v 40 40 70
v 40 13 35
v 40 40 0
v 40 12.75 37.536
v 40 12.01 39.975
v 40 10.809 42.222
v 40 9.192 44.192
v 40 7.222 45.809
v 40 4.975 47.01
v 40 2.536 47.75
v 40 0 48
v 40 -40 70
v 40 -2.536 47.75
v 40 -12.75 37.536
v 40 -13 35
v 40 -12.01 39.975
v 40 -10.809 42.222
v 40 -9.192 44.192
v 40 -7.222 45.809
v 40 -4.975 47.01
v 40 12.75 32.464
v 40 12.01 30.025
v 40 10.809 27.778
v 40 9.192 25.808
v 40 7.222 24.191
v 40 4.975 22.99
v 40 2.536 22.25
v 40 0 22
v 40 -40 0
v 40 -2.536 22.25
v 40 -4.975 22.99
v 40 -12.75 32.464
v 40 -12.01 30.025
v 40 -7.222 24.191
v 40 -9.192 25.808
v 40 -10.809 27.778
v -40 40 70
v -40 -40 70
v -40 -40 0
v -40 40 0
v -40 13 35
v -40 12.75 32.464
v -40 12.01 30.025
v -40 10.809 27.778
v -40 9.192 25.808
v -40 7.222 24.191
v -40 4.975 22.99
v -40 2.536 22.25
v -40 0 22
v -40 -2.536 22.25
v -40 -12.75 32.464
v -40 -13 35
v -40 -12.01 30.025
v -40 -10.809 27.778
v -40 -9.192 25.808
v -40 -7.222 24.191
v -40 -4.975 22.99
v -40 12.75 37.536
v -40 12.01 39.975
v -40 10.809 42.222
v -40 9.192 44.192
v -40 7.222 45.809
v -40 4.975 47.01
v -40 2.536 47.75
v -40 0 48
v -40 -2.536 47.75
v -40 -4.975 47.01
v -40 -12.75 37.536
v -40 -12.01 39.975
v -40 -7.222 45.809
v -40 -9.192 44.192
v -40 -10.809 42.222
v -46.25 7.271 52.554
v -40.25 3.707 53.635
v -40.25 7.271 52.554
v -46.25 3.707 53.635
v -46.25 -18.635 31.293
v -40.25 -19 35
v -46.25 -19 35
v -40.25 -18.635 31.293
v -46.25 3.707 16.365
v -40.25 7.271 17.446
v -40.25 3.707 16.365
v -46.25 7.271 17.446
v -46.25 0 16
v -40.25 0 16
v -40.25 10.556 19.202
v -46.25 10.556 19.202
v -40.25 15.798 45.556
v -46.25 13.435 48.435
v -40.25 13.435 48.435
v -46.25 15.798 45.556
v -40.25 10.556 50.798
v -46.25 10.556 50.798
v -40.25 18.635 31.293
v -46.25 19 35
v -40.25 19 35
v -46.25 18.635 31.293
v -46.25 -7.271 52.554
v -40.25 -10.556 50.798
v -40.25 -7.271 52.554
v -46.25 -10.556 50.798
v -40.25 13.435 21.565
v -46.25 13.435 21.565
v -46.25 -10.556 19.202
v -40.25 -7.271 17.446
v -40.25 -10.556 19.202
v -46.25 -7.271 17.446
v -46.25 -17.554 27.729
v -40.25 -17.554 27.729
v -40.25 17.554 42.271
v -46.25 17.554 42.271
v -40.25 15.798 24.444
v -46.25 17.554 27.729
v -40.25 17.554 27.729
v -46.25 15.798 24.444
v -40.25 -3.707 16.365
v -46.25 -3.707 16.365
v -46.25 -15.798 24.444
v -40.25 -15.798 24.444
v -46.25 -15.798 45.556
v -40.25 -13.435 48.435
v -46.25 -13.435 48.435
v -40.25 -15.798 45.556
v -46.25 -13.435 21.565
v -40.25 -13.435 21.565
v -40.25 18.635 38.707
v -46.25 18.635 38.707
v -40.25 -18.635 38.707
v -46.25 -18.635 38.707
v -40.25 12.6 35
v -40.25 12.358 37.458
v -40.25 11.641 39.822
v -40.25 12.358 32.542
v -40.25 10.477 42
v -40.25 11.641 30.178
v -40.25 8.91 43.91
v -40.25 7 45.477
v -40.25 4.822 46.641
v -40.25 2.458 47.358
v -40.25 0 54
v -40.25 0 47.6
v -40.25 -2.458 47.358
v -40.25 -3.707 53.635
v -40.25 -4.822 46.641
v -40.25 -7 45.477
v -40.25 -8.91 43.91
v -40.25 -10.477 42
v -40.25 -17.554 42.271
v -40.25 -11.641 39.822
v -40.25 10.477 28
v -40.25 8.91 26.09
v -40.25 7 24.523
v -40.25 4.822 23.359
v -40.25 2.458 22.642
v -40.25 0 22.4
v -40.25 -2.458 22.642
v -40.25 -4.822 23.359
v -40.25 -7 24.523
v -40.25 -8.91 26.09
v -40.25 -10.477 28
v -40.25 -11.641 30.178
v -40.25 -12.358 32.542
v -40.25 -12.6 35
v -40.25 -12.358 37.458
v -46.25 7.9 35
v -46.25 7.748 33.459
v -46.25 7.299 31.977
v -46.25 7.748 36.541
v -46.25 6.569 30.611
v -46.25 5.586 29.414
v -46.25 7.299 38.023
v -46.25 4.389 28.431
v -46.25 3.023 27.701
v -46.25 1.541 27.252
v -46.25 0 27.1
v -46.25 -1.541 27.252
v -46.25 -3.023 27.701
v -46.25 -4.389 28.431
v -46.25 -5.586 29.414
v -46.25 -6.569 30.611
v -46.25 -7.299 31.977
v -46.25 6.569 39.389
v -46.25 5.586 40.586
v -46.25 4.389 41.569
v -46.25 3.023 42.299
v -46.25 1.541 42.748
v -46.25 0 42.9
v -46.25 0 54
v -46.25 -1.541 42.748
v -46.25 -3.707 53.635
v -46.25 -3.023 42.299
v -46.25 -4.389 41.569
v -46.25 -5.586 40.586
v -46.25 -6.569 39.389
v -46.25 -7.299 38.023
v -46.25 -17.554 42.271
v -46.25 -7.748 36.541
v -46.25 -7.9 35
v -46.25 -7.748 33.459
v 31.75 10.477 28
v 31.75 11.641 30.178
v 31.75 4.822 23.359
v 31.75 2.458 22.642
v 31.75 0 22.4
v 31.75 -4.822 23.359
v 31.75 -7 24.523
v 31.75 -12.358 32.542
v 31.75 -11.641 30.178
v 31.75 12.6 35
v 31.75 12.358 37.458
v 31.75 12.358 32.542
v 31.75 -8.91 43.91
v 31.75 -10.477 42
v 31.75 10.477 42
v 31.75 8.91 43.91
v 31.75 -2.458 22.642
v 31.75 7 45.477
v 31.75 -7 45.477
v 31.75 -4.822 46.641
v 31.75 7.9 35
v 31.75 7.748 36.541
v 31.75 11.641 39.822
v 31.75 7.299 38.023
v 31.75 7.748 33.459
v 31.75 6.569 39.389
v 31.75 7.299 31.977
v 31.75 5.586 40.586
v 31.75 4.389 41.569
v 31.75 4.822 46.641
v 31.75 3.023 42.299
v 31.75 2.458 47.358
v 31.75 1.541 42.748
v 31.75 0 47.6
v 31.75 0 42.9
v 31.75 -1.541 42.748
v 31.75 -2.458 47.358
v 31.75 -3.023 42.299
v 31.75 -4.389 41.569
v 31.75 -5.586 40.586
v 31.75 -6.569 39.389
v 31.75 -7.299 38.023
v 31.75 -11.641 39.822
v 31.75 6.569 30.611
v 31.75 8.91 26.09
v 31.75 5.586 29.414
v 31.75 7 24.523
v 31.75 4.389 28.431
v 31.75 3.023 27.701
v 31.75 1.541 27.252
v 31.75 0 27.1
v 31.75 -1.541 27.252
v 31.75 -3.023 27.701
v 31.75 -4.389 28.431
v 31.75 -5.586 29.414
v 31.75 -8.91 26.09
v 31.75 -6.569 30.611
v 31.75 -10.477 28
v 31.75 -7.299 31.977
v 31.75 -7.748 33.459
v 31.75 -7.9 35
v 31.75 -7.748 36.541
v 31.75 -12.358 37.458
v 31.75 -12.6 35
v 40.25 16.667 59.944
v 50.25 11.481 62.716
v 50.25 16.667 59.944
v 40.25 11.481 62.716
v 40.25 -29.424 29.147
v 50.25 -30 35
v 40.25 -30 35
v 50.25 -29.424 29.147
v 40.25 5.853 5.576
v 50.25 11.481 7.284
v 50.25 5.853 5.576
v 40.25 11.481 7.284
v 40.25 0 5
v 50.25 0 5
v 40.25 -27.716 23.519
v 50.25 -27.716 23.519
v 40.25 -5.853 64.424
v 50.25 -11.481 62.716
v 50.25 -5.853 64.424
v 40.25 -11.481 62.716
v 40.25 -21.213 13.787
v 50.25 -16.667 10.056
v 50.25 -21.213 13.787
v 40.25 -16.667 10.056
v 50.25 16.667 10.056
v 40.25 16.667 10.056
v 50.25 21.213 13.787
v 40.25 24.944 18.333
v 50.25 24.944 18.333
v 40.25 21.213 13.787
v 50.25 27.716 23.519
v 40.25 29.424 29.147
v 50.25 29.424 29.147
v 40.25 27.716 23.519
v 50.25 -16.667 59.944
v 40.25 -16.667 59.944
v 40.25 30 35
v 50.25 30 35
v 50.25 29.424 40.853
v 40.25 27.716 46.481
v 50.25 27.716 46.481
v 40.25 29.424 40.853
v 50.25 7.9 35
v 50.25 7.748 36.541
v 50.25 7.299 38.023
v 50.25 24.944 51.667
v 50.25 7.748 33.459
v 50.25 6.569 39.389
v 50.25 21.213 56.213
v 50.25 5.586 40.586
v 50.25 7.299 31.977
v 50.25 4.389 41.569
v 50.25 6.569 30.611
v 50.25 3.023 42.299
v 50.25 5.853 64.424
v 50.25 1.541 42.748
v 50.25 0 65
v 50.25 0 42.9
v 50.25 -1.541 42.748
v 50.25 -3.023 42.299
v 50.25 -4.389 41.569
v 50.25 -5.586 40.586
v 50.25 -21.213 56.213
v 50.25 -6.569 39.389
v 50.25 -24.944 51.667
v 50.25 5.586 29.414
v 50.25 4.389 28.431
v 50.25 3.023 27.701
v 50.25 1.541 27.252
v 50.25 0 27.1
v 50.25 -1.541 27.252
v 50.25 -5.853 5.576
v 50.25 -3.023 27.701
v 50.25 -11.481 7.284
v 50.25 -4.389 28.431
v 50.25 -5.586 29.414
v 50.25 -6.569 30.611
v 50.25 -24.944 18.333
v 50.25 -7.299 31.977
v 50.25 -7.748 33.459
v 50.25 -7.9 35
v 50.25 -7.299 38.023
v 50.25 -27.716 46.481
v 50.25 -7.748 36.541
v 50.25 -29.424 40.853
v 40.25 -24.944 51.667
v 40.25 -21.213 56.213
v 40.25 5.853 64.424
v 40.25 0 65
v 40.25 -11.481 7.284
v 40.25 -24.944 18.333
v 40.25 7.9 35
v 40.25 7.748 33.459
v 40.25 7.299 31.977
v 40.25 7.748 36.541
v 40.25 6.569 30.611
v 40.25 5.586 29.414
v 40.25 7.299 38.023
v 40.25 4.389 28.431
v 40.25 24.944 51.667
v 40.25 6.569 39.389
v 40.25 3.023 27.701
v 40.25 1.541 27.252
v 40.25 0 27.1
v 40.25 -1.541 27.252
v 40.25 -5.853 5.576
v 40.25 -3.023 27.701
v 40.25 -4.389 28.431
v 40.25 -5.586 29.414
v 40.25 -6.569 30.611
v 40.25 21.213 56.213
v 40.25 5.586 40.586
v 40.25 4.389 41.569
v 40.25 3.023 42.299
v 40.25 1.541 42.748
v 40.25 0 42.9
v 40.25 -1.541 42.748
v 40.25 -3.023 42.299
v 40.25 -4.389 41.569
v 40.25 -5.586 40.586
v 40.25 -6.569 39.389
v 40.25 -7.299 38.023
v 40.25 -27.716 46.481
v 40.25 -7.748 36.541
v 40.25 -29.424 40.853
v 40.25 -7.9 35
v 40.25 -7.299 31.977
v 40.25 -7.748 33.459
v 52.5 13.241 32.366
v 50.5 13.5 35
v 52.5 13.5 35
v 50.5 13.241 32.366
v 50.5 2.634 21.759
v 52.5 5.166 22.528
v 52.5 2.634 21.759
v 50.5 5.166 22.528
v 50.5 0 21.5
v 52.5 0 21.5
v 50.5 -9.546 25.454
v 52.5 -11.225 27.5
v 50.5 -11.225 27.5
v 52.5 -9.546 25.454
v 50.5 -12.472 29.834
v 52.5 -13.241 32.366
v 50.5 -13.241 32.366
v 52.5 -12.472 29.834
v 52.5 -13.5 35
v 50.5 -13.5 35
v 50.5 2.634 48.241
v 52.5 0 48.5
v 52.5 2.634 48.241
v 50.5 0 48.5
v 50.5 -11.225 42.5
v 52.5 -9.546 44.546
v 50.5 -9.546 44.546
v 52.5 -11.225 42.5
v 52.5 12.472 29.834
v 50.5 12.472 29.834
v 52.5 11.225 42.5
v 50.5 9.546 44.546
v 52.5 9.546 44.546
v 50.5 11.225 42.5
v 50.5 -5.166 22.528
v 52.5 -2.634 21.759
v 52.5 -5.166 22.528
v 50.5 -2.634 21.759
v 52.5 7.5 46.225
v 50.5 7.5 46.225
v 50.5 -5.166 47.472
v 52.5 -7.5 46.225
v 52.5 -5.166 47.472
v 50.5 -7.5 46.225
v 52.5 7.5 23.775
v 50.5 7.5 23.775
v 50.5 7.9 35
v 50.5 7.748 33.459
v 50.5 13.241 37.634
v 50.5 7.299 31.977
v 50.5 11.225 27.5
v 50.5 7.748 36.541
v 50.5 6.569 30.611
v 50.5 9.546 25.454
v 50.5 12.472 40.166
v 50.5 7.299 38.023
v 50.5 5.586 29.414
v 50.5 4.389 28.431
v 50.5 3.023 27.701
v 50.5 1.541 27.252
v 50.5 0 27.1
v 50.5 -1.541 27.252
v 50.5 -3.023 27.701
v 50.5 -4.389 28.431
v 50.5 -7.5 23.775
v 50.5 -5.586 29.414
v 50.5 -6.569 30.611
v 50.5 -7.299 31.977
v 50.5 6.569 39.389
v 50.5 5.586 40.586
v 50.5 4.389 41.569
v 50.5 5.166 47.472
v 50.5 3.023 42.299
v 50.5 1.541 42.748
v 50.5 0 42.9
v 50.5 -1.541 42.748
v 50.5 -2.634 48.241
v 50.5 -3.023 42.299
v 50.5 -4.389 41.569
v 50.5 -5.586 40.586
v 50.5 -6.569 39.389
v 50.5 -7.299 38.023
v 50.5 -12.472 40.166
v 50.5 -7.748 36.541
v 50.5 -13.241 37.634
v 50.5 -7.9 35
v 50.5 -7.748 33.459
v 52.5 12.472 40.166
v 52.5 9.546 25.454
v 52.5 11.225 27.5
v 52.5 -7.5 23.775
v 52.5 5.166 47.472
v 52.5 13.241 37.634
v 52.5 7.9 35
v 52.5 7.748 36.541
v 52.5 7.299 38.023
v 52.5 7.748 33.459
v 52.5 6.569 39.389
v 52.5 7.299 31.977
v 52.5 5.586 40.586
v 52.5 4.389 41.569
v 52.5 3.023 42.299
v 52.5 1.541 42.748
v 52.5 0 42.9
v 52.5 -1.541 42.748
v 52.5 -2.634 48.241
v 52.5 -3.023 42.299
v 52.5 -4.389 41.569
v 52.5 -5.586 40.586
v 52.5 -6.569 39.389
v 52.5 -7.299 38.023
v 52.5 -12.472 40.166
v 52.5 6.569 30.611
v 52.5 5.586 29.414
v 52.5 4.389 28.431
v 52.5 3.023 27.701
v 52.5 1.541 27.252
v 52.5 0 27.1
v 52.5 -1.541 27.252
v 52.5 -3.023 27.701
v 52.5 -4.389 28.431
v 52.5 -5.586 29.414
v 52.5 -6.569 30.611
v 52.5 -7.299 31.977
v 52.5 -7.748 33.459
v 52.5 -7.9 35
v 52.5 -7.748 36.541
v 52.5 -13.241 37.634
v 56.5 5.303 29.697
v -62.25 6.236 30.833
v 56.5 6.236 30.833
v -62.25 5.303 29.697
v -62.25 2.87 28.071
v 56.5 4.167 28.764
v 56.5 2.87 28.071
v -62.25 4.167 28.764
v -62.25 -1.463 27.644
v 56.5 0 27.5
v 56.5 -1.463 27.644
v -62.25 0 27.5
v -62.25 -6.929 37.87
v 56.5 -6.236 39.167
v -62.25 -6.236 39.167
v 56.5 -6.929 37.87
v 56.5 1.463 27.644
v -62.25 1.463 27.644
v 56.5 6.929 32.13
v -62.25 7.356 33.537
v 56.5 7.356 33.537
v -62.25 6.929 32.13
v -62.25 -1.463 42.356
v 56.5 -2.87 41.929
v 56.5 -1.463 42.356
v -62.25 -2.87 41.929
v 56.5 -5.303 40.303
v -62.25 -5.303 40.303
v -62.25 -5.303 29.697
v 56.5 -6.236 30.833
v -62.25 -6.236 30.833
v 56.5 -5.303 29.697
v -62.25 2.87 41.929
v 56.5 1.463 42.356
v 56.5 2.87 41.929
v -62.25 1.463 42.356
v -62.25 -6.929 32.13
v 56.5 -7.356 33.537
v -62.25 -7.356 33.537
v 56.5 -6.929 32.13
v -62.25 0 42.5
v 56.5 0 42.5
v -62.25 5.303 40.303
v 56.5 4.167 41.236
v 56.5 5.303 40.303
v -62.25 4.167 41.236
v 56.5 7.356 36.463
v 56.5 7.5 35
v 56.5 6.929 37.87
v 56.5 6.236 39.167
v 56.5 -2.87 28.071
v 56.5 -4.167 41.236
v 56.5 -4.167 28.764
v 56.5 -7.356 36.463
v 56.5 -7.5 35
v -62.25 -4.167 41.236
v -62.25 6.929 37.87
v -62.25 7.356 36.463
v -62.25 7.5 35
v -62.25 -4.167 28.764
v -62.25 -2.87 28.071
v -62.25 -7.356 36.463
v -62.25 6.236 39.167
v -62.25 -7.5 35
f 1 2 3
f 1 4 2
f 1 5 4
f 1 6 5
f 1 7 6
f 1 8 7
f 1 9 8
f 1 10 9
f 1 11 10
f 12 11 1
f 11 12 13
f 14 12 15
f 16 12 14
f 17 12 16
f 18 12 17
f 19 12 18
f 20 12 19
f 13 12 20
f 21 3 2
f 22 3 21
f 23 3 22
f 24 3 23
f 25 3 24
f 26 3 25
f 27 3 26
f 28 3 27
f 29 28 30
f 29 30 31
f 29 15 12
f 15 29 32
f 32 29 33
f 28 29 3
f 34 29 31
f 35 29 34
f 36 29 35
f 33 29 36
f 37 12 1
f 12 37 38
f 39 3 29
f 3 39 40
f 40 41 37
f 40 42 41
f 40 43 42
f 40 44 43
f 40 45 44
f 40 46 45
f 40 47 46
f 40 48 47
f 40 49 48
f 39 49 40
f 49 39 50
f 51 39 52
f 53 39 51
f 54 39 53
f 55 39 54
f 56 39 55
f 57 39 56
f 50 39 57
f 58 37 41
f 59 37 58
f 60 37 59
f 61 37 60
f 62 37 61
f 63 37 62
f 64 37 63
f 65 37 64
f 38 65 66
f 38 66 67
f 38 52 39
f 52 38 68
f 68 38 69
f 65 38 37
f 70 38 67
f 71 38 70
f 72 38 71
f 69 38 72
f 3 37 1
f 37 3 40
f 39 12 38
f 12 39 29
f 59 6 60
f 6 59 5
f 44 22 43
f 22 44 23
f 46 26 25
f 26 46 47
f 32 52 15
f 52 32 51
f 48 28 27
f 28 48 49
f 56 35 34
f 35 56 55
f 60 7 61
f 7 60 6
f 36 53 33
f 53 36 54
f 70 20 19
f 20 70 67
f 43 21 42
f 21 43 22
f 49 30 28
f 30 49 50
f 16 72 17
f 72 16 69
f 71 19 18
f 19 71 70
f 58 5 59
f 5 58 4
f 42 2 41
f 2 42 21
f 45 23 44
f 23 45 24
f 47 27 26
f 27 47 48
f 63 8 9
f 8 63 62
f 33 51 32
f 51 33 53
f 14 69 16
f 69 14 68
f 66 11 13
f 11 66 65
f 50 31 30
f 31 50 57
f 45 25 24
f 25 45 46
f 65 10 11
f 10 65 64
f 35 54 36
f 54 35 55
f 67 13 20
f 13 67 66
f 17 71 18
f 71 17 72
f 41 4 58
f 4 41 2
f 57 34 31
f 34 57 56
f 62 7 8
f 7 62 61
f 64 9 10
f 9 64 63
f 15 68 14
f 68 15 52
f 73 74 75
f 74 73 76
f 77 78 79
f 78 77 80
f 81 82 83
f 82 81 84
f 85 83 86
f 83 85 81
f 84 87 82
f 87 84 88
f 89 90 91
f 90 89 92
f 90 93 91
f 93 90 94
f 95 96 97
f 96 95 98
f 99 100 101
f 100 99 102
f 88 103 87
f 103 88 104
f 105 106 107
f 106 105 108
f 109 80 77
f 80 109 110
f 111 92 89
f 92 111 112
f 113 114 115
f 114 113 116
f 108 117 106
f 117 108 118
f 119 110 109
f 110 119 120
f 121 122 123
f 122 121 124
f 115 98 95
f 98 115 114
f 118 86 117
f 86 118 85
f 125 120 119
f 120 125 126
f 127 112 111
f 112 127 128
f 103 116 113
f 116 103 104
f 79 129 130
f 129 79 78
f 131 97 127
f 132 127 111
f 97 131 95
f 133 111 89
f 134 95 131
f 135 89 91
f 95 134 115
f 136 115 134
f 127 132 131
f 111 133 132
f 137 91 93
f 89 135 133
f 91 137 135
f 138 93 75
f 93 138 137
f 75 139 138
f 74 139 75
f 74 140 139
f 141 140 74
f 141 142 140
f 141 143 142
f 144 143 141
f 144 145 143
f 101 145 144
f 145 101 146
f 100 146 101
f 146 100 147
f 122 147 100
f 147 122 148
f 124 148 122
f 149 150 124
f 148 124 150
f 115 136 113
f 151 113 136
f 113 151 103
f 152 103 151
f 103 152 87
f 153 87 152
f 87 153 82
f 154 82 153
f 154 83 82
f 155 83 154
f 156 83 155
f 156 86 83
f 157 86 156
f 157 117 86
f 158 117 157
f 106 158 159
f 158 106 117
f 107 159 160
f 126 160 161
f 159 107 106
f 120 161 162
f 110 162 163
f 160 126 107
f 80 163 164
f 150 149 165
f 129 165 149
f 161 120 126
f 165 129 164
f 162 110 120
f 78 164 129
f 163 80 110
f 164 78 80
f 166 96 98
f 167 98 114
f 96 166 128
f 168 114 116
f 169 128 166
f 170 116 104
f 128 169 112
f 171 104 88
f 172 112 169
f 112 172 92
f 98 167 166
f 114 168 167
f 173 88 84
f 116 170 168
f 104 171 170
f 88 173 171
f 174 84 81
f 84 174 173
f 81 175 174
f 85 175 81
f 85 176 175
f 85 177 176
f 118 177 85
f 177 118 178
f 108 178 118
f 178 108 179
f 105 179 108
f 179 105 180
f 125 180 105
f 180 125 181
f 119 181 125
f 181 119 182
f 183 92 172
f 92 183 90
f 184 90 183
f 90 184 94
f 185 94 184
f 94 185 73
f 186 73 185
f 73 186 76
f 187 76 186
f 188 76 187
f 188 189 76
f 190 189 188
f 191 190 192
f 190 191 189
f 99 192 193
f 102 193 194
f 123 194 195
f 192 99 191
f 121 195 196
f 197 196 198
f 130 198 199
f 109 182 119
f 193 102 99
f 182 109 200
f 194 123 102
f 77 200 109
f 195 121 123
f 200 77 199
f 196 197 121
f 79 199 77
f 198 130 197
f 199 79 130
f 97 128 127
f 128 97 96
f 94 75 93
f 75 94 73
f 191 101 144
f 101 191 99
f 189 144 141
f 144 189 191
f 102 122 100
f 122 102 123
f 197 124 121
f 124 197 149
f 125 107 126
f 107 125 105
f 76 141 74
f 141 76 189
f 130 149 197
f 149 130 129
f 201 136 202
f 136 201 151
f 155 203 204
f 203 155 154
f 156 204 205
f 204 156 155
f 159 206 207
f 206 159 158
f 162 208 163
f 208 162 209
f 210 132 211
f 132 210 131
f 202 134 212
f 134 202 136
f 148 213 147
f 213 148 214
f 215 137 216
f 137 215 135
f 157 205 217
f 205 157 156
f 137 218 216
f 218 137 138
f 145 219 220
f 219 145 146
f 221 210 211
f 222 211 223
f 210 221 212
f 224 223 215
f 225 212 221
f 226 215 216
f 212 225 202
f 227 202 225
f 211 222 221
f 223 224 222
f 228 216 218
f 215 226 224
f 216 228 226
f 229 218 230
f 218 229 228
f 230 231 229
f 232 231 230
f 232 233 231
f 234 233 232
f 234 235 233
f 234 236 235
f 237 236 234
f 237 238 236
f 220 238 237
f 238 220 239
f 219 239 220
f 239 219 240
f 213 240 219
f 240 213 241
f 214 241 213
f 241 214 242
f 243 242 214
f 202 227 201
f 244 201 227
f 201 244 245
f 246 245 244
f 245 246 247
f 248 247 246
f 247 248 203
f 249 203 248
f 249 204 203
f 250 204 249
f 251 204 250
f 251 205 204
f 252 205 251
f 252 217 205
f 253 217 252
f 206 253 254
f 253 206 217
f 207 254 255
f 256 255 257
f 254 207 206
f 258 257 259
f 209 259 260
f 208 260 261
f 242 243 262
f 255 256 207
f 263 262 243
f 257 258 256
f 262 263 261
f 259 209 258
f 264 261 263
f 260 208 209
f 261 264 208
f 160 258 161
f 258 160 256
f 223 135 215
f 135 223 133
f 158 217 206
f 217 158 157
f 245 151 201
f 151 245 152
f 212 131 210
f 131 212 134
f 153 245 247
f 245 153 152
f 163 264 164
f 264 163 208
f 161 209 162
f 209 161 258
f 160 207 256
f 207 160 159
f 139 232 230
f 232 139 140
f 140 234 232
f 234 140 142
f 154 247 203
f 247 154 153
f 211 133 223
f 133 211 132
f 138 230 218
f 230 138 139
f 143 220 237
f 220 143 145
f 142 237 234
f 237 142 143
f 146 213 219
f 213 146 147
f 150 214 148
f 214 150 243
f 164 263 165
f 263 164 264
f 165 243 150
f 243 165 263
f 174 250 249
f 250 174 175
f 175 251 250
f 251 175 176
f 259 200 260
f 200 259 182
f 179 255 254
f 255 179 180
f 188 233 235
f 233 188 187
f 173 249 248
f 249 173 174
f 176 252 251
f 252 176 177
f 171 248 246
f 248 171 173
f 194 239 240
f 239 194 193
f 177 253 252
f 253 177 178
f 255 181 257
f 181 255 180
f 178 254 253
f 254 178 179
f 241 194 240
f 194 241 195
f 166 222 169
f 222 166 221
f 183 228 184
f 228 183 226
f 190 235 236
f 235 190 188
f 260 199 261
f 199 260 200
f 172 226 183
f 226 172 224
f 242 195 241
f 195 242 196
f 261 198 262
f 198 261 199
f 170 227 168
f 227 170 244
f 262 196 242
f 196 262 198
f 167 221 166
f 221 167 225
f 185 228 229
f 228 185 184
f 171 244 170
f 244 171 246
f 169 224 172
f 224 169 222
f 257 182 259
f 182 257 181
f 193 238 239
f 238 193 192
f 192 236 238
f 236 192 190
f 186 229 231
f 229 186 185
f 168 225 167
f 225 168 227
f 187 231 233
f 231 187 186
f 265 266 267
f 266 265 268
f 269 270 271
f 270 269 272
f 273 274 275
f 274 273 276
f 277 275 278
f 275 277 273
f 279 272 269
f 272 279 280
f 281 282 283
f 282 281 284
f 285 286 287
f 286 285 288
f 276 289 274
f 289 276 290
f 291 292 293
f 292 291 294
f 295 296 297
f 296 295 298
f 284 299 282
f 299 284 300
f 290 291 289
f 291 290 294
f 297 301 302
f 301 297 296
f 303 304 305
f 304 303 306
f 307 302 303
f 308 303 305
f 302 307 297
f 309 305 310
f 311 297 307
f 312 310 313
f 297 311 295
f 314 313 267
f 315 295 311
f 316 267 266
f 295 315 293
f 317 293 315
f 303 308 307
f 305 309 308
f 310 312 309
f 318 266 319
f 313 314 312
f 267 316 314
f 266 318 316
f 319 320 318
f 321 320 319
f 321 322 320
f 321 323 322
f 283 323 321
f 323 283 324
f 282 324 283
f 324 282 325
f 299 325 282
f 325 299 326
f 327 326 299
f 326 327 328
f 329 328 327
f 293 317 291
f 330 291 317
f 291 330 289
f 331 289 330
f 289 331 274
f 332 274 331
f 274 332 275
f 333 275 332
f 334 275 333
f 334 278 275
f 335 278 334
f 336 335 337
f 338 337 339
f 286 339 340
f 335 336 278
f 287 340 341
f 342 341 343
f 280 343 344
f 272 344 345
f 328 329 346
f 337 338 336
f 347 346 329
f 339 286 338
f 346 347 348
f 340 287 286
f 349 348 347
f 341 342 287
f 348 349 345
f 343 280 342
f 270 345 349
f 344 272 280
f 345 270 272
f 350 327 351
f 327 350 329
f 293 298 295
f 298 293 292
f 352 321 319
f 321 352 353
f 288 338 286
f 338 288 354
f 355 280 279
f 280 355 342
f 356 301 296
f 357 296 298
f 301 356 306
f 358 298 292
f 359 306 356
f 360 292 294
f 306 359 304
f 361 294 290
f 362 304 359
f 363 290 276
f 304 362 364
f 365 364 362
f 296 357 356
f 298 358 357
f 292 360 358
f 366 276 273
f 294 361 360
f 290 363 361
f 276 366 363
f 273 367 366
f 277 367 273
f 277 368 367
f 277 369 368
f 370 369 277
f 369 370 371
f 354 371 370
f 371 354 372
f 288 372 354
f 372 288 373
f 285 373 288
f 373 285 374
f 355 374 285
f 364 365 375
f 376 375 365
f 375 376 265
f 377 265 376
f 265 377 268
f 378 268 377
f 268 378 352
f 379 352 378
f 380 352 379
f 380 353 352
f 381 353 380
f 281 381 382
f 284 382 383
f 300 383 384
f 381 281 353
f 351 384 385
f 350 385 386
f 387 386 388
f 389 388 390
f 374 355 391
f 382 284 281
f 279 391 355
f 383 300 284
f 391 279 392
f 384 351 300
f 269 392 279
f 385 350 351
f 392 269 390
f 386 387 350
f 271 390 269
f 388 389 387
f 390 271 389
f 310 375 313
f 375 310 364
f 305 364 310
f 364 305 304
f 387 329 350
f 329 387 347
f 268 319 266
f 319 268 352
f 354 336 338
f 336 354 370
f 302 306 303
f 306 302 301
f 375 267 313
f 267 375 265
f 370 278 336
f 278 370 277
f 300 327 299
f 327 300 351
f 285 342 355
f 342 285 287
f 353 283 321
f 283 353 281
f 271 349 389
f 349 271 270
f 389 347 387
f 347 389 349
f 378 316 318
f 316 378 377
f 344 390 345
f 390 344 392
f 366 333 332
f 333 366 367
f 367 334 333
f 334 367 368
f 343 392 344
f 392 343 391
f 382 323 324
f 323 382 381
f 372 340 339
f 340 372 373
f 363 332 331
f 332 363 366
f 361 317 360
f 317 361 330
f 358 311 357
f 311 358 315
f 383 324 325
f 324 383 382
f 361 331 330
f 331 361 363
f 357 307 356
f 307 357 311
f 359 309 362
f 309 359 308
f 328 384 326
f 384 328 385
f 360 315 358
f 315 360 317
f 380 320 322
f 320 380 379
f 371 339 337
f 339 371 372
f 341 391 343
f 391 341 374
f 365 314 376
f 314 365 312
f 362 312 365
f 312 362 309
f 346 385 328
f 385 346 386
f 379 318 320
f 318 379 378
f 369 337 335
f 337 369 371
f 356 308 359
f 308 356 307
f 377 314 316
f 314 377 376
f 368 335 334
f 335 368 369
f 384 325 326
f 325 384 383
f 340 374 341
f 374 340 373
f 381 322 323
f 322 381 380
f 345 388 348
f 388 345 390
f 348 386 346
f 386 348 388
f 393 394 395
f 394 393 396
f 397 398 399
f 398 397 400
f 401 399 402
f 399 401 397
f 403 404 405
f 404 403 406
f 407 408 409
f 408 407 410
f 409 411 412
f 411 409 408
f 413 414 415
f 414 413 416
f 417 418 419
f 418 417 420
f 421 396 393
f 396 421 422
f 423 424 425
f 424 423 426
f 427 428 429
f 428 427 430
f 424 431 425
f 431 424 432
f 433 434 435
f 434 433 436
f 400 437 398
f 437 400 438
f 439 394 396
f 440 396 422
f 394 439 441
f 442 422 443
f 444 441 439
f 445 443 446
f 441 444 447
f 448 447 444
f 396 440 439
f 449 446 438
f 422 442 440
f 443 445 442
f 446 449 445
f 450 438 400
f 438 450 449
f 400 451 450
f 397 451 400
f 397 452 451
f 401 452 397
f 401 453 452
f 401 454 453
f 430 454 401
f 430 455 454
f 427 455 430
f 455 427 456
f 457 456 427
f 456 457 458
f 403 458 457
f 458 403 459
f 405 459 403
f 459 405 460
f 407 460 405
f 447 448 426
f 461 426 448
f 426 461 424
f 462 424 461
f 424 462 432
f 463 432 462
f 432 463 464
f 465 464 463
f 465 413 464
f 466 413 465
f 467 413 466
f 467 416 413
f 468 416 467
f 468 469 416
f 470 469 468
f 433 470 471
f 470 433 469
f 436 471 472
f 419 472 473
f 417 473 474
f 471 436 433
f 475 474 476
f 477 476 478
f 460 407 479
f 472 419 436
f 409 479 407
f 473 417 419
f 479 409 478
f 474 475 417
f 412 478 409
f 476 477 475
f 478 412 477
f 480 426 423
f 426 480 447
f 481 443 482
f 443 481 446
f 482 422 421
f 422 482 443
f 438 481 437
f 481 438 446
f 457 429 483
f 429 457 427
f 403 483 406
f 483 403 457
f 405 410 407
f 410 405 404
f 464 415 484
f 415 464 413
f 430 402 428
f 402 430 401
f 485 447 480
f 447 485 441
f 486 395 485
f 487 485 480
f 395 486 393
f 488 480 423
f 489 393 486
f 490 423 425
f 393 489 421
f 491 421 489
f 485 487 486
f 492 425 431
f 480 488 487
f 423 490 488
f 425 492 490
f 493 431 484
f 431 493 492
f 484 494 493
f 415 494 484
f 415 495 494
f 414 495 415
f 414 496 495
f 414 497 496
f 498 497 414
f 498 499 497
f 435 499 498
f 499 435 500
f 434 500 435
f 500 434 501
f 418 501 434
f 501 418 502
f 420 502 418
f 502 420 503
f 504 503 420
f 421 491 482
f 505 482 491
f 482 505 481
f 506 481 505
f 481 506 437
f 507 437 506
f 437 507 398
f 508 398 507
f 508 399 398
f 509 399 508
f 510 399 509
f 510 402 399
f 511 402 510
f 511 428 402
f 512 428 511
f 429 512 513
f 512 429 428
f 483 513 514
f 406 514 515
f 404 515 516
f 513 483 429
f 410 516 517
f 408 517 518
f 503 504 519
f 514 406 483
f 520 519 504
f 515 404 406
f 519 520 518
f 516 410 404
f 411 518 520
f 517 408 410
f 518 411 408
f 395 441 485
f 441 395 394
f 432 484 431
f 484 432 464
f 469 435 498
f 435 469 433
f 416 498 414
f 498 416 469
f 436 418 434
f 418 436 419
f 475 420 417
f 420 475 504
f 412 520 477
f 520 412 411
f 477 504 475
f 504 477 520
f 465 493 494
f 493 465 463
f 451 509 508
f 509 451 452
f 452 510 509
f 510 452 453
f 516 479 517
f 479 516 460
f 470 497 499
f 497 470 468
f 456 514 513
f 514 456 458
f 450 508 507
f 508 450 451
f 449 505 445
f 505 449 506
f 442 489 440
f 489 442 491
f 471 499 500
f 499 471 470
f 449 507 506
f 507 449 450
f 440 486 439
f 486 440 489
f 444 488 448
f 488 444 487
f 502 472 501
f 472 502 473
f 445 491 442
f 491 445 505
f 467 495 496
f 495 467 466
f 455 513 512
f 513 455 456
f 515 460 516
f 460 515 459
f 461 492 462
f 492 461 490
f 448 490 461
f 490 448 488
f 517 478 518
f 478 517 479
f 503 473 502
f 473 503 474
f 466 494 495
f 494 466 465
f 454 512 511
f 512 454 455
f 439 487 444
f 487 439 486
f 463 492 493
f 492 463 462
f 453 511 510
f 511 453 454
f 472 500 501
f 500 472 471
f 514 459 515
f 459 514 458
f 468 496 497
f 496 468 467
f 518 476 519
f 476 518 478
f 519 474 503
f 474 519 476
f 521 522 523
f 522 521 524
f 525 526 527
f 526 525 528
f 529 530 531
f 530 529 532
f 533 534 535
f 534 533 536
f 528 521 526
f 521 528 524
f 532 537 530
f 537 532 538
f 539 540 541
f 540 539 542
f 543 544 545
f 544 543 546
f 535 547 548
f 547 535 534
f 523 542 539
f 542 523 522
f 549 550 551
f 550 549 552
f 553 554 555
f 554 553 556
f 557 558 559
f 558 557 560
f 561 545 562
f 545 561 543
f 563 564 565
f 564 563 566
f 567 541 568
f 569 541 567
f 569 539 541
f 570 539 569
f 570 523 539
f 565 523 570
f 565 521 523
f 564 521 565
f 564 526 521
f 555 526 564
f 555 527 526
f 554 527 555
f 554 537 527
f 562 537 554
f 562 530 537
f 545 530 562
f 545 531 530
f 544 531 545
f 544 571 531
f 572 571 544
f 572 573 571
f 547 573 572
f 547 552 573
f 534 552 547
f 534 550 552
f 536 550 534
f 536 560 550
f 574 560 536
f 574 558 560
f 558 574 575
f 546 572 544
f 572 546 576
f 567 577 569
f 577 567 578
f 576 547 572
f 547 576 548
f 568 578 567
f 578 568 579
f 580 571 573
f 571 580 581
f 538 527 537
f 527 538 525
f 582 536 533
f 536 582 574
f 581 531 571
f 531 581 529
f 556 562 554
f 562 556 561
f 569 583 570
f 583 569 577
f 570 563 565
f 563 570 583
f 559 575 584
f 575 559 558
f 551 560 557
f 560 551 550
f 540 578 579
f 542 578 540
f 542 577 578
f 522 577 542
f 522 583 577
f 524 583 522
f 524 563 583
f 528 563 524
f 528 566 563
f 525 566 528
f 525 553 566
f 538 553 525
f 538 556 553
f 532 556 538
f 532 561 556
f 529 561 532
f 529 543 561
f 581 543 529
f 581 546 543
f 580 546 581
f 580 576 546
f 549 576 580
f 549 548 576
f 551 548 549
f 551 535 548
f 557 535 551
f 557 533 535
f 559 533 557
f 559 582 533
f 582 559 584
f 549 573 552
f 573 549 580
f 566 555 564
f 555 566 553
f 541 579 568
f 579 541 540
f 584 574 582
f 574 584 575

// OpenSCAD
$fn = 32;

// ------------------------------------------------------------------------
// Bushed housing: 80 x 80 x 70 mm housing, bushing d25.2
// Every part is its own module, assembly() places them once.
// ------------------------------------------------------------------------

// --- part 1 ---
module housing() {
  difference() {
    translate([-40, -40, 0]) cube([80, 80, 70]);
    translate([0, 0, 35]) rotate([0, 90, 0]) cylinder(h = 82, d = 26, center = true);
  }
}

// --- part 2 ---
module bushing() {
  difference() {
    union() {
      cylinder(h = 6, d = 38);
      translate([0, 0, 6]) cylinder(h = 72, d = 25.2);
    }
    translate([0, 0, -1]) cylinder(h = 80, d = 15.8);
  }
}

// --- part 3 ---
module shaft() {
  translate([0, 0, -59.375]) cylinder(h = 118.75, d = 15);
}

// --- part 4 ---
module cover() {
  difference() {
    cylinder(h = 10, d = 60);
    translate([0, 0, -1]) cylinder(h = 12, d = 15.8);
  }
}

// --- part 5 ---
module washer() {
  difference() {
      translate([0, 0, 0]) cylinder(h = 2, d = 27);
      translate([0, 0, -1]) cylinder(h = 4, d = 15.8);
    }
}

// --- assembly ---
module assembly() {
  translate([0, 0, 0]) rotate([0, 0, 0]) housing();
  translate([-46.25, 0, 35]) rotate([0, 90, 0]) bushing();
  translate([-2.875, 0, 35]) rotate([0, 90, 0]) shaft();
  translate([40.25, 0, 35]) rotate([0, 90, 0]) cover();
  translate([50.5, 0, 35]) rotate([0, 90, 0]) washer();
}

assembly();
